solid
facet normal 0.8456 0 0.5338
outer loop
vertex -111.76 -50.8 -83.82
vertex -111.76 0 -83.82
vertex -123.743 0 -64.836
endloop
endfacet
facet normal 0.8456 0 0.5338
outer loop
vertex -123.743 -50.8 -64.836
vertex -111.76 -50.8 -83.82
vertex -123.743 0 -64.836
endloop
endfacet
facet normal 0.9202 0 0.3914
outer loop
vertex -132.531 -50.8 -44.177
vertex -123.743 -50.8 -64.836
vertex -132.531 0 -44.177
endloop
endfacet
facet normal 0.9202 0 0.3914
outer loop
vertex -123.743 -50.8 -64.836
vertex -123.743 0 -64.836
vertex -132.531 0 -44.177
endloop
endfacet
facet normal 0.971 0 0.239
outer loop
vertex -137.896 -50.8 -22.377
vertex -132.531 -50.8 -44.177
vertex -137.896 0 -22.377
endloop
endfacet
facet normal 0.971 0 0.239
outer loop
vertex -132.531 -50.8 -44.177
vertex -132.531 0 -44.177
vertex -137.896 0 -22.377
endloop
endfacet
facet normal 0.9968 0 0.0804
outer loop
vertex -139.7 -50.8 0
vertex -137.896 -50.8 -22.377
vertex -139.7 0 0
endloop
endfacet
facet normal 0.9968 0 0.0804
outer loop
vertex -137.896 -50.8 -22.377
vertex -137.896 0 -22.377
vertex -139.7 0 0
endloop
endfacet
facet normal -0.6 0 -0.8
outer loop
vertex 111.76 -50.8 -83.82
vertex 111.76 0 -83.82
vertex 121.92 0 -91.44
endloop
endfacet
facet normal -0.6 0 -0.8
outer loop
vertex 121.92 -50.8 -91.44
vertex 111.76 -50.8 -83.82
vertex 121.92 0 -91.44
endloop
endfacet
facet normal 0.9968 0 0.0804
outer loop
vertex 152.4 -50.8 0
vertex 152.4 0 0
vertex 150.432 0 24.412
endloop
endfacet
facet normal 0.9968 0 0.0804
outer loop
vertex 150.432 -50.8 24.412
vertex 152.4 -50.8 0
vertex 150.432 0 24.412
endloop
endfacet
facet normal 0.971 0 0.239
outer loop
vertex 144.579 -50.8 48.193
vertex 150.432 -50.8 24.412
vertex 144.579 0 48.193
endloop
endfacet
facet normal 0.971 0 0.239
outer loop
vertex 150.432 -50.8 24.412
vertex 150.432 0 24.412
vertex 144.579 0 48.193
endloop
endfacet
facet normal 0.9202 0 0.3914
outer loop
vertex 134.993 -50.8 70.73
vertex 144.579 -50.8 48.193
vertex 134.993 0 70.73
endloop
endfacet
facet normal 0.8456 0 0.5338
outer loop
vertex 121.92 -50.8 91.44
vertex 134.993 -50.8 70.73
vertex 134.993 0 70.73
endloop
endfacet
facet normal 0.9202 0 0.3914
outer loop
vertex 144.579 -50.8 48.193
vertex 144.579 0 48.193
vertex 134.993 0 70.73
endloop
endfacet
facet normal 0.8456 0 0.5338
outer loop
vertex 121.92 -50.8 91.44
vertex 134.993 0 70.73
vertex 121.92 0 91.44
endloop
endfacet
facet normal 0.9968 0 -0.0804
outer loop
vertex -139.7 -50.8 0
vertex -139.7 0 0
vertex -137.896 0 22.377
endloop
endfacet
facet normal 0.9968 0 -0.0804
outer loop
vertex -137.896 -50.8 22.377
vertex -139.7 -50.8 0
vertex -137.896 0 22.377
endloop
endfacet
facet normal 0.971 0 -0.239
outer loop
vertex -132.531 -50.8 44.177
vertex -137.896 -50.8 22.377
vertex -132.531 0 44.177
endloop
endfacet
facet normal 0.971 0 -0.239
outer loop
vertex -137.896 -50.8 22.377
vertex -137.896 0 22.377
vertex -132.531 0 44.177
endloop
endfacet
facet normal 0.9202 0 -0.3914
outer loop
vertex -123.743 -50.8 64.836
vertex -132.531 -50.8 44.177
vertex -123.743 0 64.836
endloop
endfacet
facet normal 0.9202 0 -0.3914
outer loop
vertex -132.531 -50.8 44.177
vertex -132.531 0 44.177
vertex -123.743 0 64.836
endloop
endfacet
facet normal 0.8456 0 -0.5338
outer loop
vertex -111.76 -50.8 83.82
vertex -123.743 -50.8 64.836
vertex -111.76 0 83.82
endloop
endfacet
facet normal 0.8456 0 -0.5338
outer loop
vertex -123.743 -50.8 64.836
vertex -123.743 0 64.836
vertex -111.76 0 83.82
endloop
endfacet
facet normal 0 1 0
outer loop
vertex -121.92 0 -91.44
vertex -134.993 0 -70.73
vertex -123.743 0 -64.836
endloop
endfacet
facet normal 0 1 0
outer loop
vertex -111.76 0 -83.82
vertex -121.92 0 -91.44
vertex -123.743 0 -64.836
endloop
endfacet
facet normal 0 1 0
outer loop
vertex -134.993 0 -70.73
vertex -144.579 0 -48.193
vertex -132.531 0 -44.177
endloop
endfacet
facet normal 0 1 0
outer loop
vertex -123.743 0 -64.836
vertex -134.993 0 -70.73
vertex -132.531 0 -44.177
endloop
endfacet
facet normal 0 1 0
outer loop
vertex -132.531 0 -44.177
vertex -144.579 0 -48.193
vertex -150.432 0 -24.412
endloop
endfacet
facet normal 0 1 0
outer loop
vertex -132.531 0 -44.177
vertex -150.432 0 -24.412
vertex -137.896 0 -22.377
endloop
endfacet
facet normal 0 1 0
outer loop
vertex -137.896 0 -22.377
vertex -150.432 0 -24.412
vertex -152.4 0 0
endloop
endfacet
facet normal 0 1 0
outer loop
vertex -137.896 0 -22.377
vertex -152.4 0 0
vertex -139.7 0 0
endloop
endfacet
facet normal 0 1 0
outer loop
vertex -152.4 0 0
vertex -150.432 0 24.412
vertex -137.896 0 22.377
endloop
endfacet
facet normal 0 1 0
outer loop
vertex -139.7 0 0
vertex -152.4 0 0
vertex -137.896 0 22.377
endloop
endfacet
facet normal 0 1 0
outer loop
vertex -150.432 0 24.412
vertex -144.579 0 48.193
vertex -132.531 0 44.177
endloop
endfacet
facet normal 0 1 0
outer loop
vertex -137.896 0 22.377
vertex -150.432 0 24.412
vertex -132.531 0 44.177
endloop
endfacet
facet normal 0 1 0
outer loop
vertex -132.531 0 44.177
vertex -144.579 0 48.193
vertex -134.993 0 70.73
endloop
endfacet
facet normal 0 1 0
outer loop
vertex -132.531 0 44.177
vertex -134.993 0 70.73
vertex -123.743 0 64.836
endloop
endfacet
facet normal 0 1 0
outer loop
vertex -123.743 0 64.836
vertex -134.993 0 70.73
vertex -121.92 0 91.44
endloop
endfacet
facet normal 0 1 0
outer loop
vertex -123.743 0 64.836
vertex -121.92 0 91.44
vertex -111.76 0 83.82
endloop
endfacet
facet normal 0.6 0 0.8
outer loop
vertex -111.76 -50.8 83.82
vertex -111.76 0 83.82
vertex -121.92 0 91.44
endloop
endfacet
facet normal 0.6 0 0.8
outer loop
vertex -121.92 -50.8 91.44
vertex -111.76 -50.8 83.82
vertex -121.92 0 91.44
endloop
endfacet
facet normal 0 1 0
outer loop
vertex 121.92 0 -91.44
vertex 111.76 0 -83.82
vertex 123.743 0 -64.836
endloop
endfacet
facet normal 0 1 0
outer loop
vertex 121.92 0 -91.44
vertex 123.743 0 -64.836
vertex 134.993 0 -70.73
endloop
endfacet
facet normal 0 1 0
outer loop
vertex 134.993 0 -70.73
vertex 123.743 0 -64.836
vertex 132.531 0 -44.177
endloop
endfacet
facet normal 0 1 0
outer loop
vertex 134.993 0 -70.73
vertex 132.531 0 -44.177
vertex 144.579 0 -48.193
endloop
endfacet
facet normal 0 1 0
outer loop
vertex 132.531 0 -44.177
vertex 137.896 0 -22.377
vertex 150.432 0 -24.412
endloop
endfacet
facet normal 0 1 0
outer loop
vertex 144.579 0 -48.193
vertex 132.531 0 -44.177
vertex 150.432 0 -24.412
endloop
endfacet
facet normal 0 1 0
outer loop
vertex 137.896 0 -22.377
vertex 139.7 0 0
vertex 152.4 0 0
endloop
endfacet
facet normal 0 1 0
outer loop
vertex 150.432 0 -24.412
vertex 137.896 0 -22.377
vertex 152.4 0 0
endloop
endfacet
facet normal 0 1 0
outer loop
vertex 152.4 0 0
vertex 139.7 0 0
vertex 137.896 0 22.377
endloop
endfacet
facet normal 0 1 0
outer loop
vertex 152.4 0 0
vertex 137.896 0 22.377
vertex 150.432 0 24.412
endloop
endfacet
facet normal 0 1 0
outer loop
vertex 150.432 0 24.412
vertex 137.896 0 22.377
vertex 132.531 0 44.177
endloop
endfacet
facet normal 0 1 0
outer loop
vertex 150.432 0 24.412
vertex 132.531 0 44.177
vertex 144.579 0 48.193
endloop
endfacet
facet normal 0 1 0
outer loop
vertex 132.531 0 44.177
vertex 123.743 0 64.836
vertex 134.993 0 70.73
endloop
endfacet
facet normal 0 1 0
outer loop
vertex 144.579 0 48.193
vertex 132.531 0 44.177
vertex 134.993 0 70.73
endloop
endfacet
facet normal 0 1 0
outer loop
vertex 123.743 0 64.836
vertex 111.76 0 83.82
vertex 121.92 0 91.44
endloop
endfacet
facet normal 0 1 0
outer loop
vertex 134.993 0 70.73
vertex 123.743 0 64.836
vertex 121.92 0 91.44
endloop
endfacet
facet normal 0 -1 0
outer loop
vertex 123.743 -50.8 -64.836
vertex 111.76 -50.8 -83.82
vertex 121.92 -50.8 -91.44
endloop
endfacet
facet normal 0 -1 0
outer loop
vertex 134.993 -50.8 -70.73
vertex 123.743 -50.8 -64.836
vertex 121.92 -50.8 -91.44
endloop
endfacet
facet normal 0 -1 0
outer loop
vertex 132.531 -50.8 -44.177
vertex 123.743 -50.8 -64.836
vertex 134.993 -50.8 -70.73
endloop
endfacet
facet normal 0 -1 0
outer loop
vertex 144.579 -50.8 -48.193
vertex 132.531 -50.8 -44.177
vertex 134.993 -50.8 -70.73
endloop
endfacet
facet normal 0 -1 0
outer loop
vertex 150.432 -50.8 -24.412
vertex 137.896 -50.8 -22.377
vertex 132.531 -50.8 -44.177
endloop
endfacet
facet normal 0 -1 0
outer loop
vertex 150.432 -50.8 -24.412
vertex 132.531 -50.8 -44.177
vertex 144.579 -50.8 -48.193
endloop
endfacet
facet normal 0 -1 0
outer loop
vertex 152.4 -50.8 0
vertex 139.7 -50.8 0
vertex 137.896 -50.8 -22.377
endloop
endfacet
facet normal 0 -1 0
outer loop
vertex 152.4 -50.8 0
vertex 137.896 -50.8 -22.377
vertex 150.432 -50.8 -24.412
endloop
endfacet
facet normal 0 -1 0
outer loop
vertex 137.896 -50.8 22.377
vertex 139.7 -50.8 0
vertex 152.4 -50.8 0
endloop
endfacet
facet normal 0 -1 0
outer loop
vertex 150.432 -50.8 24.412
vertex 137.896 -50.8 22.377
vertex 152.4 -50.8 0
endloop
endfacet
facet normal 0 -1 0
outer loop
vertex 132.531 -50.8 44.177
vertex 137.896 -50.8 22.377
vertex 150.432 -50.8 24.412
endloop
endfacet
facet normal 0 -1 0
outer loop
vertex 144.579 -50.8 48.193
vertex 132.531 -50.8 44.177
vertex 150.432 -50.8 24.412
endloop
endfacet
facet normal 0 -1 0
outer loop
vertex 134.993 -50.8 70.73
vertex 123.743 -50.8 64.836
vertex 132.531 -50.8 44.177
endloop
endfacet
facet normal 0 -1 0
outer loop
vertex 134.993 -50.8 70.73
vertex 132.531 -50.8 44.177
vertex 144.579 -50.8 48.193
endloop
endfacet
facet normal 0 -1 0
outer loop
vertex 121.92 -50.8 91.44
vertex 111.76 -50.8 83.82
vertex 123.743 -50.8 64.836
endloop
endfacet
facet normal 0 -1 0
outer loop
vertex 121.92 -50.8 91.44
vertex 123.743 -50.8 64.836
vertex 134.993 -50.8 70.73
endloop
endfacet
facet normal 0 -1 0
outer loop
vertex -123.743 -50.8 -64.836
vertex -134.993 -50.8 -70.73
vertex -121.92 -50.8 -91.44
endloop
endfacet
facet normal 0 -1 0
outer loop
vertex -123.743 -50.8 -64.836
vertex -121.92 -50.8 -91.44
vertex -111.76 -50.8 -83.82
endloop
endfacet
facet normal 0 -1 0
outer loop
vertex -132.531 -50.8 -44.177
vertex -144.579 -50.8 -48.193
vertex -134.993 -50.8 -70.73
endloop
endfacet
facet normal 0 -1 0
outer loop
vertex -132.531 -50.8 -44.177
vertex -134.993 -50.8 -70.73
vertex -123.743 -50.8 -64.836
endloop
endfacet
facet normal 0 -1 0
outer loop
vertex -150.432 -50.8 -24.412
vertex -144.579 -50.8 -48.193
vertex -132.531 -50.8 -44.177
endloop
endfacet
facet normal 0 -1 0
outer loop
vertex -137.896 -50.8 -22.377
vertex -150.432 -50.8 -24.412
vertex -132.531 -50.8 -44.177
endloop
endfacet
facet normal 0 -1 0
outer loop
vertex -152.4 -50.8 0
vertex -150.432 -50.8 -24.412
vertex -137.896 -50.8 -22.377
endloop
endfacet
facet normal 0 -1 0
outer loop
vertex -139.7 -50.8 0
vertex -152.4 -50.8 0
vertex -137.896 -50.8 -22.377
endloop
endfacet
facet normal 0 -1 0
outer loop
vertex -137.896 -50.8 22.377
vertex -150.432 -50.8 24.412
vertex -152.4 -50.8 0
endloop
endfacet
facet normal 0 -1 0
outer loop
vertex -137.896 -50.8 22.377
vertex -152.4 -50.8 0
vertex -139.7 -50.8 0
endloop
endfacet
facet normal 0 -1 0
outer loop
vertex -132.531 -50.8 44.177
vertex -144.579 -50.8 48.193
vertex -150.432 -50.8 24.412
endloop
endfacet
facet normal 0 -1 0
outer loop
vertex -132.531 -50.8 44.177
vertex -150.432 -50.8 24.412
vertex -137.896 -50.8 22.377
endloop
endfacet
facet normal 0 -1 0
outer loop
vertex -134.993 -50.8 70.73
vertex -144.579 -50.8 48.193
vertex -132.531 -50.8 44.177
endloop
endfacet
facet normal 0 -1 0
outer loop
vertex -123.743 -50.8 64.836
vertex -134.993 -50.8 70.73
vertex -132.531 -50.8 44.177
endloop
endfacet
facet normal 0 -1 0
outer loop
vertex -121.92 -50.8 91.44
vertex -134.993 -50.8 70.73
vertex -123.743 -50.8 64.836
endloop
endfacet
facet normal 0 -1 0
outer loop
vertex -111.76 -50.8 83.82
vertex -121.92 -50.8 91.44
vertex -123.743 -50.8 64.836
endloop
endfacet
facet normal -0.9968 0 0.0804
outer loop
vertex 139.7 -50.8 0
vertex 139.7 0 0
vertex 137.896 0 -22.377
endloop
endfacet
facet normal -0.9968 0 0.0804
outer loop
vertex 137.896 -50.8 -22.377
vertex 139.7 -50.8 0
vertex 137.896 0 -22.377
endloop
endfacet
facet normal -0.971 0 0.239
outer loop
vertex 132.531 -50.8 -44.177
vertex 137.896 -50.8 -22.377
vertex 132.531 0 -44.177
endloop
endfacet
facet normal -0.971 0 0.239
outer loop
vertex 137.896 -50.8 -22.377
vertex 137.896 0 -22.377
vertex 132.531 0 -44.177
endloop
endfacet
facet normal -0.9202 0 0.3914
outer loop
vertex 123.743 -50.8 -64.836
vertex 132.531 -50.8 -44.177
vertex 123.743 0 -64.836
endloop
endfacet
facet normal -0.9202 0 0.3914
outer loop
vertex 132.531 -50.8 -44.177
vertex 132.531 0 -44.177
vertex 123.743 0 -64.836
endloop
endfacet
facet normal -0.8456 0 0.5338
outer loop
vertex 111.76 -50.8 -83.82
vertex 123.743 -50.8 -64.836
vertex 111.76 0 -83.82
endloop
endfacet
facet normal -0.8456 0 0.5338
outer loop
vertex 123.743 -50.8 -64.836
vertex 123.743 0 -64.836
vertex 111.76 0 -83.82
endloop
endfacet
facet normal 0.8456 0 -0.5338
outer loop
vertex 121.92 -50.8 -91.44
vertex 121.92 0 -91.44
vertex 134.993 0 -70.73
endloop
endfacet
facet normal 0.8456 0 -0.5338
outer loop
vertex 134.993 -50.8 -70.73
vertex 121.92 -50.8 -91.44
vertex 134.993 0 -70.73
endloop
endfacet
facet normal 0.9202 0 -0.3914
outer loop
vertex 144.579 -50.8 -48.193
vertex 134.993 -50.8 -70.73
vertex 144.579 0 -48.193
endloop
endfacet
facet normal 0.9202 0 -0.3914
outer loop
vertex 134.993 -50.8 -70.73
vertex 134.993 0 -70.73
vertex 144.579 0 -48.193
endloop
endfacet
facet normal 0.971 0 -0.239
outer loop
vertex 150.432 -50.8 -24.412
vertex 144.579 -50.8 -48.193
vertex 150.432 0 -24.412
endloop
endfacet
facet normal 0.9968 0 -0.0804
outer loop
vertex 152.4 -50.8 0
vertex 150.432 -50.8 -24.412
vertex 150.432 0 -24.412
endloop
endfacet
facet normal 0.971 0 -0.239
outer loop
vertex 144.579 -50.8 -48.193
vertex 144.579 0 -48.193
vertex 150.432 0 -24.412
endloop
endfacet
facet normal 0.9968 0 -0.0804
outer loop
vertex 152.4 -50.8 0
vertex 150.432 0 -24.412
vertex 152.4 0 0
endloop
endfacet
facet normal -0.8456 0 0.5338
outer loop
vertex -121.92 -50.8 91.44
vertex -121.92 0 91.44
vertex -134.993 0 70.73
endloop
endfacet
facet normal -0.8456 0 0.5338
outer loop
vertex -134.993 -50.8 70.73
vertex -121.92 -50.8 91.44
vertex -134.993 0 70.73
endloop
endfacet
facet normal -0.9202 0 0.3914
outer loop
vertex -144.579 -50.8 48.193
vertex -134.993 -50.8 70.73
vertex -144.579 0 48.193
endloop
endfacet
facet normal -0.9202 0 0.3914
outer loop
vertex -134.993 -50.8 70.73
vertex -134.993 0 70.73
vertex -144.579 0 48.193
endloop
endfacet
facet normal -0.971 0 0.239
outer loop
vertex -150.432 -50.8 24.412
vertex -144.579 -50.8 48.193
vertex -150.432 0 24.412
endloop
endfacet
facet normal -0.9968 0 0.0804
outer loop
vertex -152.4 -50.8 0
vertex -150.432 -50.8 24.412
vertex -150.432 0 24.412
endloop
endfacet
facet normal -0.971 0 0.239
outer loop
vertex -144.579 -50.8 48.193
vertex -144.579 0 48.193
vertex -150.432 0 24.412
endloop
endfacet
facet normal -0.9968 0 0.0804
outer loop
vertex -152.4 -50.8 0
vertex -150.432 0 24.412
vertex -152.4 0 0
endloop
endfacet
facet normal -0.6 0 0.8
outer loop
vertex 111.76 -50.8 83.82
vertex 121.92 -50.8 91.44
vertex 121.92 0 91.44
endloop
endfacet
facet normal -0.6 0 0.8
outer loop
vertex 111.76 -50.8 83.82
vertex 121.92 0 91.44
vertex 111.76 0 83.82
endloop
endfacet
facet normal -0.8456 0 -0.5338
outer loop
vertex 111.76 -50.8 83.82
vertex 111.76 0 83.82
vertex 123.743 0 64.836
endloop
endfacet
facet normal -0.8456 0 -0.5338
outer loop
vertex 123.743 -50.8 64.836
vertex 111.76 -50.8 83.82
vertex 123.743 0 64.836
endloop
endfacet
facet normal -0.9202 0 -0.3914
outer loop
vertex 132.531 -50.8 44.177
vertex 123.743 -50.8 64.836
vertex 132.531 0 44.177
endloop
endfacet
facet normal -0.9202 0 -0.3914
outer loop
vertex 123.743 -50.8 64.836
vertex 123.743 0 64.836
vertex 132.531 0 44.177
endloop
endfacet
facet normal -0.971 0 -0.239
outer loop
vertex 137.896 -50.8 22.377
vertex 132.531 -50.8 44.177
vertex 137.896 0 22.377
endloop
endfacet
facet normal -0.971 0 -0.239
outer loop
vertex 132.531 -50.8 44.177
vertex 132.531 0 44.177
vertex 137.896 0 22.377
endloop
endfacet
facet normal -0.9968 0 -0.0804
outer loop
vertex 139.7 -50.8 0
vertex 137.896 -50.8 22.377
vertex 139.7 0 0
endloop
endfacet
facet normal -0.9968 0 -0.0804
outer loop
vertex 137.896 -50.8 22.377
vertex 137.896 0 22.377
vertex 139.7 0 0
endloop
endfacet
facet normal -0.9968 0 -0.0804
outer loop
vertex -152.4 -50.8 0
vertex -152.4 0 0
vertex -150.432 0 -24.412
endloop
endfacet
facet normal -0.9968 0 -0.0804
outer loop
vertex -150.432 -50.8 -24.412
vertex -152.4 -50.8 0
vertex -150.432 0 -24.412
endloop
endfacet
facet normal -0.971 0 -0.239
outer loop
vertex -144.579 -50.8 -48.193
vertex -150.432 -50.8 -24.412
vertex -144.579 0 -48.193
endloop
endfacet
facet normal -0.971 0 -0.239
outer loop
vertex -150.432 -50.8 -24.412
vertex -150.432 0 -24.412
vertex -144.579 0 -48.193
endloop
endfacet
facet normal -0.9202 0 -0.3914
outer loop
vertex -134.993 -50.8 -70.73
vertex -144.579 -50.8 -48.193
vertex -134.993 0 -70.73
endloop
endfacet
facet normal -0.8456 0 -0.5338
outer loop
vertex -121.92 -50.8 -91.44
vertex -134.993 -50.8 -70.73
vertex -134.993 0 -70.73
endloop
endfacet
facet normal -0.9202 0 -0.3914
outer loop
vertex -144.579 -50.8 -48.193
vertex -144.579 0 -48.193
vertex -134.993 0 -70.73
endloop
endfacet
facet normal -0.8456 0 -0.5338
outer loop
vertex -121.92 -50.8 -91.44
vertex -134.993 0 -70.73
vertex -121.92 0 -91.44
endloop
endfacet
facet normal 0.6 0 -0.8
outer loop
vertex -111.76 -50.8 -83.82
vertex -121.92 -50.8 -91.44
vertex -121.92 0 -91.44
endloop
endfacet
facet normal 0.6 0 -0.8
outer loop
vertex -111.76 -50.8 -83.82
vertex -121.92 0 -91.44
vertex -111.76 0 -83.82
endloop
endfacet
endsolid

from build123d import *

# Parameters (mm, degrees)
F1_DEPTH = 50.8


with BuildPart() as f1:
    # F0 (on Front) → F1 (new body)
    with BuildSketch(Plane.XZ):
        with BuildLine():
            ThreePointArc((139.7, 0), (132.531057, -44.177019), (111.76, -83.82))
            Line((111.76, -83.82), (121.92, -91.44))
            ThreePointArc((121.92, -91.44), (144.579335, -48.193112), (152.4, 0))
            Line((152.4, 0), (139.7, 0))
        make_face()
        with BuildLine():
            ThreePointArc((111.76, 83.82), (132.531057, 44.177019), (139.7, 0))
            Line((139.7, 0), (152.4, 0))
            ThreePointArc((152.4, 0), (144.579335, 48.193112), (121.92, 91.44))
            Line((121.92, 91.44), (111.76, 83.82))
        make_face()
        with BuildLine():
            ThreePointArc((-121.92, 91.44), (-144.579335, 48.193112), (-152.4, 0))
            Line((-152.4, 0), (-139.7, 0))
            ThreePointArc((-139.7, 0), (-132.531057, 44.177019), (-111.76, 83.82))
            Line((-111.76, 83.82), (-121.92, 91.44))
        make_face()
        with BuildLine():
            Line((-139.7, 0), (-152.4, 0))
            ThreePointArc((-152.4, 0), (-144.579335, -48.193112), (-121.92, -91.44))
            Line((-121.92, -91.44), (-111.76, -83.82))
            ThreePointArc((-111.76, -83.82), (-132.531057, -44.177019), (-139.7, 0))
        make_face()
    extrude(amount=F1_DEPTH)


solid = f1.part
